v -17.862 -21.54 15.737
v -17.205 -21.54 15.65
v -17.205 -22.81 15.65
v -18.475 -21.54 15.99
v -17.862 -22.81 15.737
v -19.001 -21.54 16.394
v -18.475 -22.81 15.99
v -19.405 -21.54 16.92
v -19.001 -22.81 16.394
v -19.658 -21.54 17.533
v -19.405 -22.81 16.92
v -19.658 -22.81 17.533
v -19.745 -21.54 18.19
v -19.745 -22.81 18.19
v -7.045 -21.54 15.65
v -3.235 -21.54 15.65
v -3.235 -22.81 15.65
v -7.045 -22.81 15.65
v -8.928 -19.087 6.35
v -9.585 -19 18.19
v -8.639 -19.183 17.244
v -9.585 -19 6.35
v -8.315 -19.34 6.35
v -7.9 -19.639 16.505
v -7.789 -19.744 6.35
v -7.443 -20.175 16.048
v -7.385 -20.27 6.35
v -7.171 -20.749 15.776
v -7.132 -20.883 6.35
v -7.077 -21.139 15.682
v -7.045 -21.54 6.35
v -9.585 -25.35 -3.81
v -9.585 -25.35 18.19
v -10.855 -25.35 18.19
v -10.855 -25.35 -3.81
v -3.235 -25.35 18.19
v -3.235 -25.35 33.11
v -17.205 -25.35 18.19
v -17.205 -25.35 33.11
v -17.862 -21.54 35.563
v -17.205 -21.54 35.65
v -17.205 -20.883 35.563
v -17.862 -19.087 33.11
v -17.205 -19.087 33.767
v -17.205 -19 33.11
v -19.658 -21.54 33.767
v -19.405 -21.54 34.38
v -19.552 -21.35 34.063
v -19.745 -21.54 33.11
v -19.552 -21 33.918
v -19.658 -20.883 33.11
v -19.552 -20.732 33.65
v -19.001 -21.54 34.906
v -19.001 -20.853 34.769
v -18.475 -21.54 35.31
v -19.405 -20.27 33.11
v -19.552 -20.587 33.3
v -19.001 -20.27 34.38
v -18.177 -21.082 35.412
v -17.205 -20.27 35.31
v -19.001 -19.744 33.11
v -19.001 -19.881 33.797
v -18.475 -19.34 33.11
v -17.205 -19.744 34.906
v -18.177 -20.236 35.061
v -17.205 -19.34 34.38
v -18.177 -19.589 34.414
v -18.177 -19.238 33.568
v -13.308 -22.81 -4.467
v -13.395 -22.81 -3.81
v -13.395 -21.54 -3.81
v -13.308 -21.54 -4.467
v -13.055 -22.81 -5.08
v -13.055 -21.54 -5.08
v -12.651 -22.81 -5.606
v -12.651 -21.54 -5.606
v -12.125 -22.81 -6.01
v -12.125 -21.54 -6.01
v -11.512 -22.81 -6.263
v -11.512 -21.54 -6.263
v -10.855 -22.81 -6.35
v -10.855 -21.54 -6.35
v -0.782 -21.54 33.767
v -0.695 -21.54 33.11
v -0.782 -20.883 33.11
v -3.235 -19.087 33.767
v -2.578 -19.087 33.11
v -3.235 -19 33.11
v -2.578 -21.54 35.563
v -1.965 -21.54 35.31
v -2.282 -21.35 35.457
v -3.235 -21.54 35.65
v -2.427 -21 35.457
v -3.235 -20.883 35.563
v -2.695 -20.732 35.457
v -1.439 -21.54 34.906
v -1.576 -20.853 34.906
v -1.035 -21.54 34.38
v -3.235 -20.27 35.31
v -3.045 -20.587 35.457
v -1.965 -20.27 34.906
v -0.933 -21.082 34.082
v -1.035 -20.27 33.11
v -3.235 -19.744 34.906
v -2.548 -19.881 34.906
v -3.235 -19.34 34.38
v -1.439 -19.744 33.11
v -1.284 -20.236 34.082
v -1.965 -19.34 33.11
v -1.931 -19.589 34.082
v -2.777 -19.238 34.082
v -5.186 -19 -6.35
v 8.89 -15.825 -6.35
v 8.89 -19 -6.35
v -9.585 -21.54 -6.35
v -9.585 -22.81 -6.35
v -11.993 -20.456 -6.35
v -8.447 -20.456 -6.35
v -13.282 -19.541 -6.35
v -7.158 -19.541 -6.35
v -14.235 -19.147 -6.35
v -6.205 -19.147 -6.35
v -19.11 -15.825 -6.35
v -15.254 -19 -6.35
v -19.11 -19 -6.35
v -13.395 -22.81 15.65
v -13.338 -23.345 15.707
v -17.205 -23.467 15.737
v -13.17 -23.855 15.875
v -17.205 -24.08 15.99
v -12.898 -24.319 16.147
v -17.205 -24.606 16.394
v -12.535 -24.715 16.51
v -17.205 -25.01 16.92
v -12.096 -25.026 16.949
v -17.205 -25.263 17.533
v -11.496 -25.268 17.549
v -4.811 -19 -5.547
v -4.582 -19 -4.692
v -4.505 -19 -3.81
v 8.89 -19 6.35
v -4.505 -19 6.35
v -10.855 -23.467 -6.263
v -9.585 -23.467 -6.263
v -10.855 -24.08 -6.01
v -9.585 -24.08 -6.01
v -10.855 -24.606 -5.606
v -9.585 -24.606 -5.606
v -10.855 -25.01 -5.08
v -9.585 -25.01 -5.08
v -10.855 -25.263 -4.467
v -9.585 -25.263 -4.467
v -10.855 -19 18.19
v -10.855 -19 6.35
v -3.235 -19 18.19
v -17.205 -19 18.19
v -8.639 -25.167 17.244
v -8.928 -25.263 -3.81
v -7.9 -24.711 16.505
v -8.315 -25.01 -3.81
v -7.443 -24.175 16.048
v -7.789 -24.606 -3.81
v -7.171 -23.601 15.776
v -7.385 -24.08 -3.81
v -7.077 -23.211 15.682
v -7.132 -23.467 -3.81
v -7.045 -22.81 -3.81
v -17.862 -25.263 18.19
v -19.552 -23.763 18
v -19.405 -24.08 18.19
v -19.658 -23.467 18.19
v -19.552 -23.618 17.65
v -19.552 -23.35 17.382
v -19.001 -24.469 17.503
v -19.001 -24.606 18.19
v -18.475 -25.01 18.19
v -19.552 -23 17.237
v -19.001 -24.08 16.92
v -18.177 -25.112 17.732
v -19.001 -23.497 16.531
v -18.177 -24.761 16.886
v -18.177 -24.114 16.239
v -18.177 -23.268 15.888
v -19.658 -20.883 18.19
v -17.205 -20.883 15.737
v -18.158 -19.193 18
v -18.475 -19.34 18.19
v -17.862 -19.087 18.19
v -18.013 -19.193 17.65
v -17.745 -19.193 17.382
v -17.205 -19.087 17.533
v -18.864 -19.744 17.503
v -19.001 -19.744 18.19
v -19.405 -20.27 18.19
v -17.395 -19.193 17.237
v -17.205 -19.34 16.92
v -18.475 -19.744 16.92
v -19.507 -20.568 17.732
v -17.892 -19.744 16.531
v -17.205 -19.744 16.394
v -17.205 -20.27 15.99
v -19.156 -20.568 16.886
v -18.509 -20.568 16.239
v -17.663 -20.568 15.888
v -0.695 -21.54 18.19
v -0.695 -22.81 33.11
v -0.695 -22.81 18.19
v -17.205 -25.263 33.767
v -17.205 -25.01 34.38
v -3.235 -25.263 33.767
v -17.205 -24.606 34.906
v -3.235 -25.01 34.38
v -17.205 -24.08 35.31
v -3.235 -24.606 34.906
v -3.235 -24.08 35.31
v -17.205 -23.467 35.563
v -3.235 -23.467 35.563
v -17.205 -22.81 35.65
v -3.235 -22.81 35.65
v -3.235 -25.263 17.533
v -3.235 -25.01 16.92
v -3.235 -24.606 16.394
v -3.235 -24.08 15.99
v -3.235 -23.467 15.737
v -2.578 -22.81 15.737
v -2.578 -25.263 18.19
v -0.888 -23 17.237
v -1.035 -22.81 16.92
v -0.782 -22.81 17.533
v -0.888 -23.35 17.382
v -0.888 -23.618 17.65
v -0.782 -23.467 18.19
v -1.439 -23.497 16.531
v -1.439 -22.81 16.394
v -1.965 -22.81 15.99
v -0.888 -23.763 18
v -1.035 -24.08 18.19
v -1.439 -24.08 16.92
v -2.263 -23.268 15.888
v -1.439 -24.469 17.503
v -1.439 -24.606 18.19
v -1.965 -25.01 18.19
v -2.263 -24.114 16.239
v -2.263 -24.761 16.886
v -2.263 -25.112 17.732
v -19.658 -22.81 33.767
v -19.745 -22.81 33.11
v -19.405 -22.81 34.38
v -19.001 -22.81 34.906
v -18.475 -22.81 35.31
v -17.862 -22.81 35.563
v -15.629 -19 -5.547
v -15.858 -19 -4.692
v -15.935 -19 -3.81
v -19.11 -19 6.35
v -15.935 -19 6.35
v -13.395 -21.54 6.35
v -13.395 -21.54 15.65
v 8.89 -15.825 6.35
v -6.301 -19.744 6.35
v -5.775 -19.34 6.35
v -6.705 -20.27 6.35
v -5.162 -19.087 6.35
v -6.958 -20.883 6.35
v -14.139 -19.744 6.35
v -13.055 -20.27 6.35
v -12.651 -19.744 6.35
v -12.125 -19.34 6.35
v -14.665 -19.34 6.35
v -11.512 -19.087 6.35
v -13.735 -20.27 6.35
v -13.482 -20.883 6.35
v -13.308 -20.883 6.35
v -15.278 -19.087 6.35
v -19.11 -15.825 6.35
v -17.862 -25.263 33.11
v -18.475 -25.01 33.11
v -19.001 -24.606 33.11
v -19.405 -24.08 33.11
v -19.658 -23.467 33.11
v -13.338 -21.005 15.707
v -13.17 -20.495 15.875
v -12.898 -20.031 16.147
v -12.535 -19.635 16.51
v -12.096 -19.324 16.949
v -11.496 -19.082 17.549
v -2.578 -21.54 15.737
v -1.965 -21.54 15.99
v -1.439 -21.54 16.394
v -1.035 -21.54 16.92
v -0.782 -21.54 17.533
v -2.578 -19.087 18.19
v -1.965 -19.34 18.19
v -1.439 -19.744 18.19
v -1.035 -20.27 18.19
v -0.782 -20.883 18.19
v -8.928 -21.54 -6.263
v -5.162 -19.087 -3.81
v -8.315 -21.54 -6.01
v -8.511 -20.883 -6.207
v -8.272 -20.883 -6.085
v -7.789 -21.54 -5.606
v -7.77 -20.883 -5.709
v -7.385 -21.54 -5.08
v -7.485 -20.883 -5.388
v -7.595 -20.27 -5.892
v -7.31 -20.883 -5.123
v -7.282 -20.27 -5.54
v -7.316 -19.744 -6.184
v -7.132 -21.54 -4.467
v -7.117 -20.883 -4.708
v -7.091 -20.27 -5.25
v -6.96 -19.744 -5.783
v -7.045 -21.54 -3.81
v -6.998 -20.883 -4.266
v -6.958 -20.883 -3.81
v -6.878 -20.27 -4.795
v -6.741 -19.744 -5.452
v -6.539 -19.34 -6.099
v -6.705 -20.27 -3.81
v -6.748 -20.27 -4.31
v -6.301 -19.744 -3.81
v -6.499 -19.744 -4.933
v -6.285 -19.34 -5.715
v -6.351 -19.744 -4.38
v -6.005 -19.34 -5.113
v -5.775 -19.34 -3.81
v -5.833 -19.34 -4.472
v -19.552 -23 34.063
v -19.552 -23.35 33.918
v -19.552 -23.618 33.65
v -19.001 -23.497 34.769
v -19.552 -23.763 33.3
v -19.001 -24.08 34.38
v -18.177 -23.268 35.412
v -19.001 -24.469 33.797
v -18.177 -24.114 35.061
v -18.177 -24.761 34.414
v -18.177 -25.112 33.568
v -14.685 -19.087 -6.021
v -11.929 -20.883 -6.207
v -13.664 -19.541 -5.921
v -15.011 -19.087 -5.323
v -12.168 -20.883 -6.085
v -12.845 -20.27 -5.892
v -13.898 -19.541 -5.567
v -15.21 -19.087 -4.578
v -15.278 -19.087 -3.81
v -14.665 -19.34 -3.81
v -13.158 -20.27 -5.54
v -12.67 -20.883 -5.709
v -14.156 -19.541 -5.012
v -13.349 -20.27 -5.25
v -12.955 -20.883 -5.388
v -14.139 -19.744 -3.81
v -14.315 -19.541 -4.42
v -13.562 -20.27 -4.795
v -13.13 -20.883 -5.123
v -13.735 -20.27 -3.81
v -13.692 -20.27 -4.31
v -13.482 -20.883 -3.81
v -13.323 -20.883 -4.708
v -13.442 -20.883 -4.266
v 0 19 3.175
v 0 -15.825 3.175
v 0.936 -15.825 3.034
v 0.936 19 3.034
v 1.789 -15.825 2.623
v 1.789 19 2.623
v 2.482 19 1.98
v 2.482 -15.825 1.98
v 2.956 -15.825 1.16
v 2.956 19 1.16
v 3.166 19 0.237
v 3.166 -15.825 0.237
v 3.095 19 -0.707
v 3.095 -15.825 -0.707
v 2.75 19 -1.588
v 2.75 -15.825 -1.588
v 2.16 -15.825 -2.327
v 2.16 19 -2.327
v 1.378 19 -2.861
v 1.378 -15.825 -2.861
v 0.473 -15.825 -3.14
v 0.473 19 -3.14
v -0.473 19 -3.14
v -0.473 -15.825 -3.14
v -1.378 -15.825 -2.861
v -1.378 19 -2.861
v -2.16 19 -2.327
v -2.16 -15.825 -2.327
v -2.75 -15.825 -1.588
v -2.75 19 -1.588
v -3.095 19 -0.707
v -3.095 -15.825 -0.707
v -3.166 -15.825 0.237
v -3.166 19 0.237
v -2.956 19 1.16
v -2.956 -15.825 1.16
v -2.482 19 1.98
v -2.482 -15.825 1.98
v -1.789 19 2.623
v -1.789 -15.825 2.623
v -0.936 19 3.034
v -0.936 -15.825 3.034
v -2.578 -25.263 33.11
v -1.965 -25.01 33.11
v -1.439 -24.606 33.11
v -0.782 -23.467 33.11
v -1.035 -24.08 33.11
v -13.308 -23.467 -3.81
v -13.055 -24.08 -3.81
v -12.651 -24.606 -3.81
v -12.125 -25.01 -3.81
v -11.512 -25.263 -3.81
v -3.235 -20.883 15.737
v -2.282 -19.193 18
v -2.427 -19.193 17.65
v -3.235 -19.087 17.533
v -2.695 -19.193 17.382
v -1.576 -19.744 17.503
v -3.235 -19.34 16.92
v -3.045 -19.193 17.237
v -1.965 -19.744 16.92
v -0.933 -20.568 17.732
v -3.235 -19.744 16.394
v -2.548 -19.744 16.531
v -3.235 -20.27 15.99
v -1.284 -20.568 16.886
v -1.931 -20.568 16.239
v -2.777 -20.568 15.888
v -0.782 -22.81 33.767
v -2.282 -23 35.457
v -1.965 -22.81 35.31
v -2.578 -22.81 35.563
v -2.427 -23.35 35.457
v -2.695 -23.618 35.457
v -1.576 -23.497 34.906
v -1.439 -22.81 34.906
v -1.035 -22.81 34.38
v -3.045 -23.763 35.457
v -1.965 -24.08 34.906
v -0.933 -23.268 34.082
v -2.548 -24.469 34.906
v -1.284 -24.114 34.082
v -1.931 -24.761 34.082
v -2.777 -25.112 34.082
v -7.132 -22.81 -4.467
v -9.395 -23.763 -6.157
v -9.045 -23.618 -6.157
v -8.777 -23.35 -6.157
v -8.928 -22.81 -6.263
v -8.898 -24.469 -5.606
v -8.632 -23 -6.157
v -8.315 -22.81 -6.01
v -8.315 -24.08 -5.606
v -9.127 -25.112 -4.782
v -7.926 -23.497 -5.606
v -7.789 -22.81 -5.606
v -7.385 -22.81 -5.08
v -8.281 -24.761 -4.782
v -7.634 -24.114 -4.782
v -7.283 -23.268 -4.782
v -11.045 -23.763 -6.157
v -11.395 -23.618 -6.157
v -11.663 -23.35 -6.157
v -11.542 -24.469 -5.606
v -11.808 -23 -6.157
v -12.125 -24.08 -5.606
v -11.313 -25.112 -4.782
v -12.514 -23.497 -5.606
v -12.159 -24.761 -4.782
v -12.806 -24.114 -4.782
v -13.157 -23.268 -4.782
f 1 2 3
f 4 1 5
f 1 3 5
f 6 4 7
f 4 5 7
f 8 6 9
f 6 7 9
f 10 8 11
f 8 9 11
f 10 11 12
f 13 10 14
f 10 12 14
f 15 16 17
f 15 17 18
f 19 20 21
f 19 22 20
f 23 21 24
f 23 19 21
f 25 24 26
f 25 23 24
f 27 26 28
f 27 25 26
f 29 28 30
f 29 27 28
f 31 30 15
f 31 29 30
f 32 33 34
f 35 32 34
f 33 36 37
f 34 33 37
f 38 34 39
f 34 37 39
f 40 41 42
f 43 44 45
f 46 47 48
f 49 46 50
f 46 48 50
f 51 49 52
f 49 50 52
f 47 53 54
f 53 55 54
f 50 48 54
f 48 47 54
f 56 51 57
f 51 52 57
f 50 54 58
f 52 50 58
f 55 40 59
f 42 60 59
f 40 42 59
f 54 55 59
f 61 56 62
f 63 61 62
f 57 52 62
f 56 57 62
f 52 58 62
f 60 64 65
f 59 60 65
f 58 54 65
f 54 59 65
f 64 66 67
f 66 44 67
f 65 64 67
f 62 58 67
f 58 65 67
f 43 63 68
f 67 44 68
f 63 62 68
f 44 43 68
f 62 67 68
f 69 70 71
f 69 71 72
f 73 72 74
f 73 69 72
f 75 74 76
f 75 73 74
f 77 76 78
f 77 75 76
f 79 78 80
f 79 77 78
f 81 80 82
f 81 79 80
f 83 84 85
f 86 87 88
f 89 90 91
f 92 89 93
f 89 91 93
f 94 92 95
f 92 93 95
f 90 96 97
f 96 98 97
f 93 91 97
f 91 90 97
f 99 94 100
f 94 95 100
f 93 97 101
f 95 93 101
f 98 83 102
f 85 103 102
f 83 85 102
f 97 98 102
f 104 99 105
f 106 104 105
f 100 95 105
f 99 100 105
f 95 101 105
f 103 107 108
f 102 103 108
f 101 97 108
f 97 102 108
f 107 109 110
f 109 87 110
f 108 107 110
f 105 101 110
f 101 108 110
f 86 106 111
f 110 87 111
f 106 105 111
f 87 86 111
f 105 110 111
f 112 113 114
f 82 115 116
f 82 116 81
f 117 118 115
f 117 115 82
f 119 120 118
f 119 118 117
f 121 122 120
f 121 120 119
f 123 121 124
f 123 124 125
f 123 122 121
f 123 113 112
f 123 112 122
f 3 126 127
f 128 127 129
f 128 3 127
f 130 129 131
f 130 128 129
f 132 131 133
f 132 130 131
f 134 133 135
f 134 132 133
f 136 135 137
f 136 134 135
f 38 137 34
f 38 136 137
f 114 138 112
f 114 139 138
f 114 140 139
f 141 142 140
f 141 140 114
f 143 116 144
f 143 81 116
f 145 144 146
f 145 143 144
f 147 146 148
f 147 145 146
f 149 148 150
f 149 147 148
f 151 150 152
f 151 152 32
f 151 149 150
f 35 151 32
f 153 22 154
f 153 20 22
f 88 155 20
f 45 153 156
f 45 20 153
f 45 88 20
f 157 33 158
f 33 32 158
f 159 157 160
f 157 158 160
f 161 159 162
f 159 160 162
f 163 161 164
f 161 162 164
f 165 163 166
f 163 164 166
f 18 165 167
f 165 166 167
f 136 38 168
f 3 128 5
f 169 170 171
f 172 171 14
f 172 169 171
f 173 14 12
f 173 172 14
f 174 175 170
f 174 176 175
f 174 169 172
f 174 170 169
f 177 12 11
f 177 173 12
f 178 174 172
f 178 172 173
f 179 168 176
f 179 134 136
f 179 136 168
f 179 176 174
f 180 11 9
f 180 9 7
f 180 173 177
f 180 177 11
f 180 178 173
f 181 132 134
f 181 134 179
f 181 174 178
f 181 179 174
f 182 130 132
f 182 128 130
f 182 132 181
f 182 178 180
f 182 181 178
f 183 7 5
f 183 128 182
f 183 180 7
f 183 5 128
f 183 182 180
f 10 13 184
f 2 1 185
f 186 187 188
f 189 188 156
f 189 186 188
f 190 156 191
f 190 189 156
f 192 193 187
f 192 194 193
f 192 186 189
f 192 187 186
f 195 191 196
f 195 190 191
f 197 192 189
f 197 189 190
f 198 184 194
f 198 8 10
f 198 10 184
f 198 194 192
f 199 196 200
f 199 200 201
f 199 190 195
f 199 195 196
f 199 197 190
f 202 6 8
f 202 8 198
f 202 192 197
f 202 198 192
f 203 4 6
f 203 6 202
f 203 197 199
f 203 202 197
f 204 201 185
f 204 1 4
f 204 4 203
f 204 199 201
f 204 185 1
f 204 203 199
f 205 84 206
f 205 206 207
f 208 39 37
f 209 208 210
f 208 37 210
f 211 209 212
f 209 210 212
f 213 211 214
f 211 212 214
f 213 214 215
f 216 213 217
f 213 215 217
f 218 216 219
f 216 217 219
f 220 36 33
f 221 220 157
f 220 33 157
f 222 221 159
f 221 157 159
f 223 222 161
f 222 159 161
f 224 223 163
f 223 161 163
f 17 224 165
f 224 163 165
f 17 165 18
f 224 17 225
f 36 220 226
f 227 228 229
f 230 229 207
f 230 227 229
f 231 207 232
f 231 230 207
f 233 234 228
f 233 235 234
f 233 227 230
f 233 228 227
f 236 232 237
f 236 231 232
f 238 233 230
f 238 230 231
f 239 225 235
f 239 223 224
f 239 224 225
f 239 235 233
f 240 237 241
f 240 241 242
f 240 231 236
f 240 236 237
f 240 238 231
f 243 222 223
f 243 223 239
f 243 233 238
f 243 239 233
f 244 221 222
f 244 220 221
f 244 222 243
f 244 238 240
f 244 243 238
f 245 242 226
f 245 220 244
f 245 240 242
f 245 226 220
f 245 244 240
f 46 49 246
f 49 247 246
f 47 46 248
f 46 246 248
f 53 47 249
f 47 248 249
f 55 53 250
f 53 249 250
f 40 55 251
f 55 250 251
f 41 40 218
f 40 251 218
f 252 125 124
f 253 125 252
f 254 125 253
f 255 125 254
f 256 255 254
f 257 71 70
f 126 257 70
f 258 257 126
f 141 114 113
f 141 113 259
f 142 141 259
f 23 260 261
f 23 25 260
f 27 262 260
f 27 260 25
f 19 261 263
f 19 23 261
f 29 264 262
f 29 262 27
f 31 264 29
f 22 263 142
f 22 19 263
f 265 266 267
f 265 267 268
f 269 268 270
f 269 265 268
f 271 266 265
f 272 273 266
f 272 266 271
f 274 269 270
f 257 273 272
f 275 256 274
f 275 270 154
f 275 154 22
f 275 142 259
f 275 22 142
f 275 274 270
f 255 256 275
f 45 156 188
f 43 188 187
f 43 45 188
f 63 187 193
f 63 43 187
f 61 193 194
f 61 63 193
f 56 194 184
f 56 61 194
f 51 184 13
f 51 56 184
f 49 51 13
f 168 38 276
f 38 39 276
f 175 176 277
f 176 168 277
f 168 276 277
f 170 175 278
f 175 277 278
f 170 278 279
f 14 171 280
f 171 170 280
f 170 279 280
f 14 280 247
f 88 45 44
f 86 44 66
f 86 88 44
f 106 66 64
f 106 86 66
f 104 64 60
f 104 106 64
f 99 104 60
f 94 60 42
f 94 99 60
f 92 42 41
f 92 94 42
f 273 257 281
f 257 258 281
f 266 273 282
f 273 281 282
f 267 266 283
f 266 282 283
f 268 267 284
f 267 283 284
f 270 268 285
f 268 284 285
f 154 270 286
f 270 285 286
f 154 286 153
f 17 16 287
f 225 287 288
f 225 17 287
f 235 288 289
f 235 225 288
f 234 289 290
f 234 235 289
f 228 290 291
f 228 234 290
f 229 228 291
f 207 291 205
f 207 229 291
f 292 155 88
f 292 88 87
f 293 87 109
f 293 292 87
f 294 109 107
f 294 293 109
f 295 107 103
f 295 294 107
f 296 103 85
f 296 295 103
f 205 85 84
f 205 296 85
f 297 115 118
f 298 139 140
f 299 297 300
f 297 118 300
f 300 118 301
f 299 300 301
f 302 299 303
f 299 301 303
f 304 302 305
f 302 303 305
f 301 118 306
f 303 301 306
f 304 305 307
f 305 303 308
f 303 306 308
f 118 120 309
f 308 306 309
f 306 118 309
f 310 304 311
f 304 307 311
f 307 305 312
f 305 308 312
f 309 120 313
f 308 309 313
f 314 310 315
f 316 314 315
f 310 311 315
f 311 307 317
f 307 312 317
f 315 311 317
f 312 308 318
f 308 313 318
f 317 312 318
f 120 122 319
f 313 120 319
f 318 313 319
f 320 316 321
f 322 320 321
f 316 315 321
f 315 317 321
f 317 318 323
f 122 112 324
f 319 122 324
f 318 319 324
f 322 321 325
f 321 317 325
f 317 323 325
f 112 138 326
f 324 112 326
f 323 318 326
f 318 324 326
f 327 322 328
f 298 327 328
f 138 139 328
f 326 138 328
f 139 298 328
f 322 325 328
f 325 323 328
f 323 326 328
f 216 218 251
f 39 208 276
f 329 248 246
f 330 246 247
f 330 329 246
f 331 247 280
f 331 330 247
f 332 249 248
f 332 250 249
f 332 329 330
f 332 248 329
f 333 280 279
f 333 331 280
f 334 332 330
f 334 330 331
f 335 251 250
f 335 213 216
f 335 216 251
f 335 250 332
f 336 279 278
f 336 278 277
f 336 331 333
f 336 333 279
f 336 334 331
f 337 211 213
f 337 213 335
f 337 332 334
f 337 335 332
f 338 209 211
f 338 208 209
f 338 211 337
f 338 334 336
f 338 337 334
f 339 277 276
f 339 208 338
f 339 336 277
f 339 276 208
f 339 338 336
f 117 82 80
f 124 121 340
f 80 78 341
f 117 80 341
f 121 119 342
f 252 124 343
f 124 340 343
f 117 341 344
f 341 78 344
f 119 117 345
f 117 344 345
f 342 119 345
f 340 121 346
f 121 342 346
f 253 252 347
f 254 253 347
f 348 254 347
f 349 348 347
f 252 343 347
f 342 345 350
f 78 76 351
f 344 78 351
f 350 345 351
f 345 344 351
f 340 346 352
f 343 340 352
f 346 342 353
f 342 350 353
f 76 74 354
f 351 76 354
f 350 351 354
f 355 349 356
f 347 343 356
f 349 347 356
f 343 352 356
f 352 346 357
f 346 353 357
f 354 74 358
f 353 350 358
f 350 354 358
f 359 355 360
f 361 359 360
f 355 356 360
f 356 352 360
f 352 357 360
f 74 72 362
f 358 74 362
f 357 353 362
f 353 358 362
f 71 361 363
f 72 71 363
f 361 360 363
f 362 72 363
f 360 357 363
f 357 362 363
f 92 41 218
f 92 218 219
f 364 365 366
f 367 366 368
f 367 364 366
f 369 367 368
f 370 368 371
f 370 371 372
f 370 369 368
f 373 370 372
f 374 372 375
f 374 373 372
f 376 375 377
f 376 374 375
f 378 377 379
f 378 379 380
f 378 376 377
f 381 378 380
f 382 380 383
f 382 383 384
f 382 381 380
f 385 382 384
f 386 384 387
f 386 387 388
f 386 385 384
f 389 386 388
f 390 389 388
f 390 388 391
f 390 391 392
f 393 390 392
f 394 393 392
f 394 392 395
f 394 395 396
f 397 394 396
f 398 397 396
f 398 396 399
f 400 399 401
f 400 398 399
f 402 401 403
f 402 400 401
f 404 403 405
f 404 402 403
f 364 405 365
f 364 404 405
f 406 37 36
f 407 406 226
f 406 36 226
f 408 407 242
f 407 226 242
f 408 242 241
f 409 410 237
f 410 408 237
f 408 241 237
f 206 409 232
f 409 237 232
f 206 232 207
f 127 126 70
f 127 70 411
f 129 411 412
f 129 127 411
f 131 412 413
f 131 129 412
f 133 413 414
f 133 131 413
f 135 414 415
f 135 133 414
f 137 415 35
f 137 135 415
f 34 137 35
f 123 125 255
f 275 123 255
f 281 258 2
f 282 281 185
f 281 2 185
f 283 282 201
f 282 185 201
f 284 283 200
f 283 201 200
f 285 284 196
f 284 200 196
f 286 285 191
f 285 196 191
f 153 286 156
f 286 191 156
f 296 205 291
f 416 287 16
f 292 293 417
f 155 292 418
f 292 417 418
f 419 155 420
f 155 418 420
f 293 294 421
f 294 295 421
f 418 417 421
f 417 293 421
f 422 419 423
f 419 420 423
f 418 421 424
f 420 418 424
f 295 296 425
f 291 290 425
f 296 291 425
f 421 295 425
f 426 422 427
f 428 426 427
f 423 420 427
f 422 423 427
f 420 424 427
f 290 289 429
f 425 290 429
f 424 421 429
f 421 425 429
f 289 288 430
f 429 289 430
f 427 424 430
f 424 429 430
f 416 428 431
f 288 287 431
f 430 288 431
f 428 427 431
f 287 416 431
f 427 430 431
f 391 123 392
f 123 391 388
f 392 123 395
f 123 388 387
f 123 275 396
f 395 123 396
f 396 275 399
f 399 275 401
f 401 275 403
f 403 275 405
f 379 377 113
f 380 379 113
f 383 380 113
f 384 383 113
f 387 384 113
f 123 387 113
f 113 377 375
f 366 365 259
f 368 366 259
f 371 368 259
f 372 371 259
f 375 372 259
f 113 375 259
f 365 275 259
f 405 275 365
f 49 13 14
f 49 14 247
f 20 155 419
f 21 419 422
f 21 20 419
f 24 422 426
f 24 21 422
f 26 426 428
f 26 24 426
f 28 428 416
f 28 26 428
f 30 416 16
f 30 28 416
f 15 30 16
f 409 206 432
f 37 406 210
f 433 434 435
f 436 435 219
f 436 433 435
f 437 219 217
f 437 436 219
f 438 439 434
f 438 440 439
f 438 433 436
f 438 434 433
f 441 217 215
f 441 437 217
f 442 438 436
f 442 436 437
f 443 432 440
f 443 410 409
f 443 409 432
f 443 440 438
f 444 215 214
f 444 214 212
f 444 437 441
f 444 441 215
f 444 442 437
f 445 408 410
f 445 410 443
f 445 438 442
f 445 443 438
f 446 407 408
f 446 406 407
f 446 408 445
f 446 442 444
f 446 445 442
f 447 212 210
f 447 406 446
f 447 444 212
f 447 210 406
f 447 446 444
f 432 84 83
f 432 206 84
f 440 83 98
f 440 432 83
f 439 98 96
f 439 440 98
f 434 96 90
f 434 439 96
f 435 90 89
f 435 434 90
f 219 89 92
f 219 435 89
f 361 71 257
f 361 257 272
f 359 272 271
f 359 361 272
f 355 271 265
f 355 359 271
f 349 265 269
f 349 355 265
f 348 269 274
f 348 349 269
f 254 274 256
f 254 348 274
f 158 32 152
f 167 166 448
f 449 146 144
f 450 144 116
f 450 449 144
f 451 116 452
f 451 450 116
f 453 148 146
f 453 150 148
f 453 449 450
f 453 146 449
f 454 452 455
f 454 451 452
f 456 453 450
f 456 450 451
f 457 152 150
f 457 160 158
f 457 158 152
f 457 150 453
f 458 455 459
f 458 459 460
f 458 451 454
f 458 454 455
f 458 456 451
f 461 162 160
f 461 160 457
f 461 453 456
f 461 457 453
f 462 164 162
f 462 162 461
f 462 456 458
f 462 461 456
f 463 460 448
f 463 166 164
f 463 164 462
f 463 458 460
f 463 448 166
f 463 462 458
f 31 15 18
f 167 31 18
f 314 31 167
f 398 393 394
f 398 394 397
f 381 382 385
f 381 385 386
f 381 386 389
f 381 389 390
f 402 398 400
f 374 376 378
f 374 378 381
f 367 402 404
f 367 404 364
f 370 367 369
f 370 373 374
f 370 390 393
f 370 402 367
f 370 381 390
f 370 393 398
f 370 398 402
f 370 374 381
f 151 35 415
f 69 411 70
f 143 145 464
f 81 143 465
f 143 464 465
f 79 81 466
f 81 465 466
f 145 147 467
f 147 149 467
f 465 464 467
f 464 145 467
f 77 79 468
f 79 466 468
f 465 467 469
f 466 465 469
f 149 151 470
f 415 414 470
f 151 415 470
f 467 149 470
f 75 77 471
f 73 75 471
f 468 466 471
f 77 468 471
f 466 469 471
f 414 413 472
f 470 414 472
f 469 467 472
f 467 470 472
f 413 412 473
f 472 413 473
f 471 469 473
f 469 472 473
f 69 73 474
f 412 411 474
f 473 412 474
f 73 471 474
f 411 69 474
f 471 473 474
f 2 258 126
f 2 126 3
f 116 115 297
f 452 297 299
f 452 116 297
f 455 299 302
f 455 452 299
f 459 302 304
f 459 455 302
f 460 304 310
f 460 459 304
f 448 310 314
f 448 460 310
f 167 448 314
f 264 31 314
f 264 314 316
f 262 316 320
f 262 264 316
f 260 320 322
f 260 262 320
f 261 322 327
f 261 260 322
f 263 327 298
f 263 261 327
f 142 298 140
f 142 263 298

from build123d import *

# Parameters (mm, degrees)
SKETCH1_R           = 3.175
BOSS_EXTRUDE1_DEPTH = 19
SKETCH2_W           = 28
SKETCH2_H           = 12.7
BOSS_EXTRUDE2_DEPTH = 3.175
BOSS_EXTRUDE3_DEPTH = 6.35
FILLET1_R           = 2.54
FILLET2_R           = 2.54


with BuildPart() as part:
    # Sketch1 → Boss-Extrude1 (new, symmetric)
    with BuildSketch(Plane(origin=(0, 0, 0), x_dir=(1, 0, 0), z_dir=(0, 1, 0))):
        with Locations(Location((0, 0, 0), (0, 0, 270))):
            Circle(SKETCH1_R)
    extrude(amount=BOSS_EXTRUDE1_DEPTH, both=True)

    # Sketch2 → Boss-Extrude2 (add)
    with BuildSketch(Plane.XZ.offset(19)):
        with Locations((-5.11, 0)):
            Rectangle(SKETCH2_W, SKETCH2_H)
    extrude(amount=-BOSS_EXTRUDE2_DEPTH)

    # Sketch3 → Boss-Extrude3 (add)
    with BuildSketch(Plane.XZ.offset(19)):
        Polygon((-13.395, -6.35), (-13.395, 15.65), (-19.745, 15.65), (-19.745, 35.65), (-0.695, 35.65), (-0.695, 15.65), (-7.045, 15.65), (-7.045, -6.35), align=None)
    extrude(amount=BOSS_EXTRUDE3_DEPTH)

    # Fillet1
    fillet1_edges = [part.edges().sort_by_distance(p)[0] for p in [
        (-13.395, -25.35, 4.65),
        (-16.57, -25.35, 15.65),
        (-3.87, -25.35, 15.65),
        (-7.045, -25.35, 4.65),
        (-10.22, -25.35, -6.35),
        (-0.695, -22.175, 15.65),
        (-0.695, -25.35, 25.65),
        (-0.695, -19, 25.65),
        (-0.695, -22.175, 35.65),
        (-10.22, -25.35, 35.65),
        (-10.22, -19, 35.65),
        (-19.745, -22.175, 35.65),
        (-19.745, -25.35, 25.65),
        (-19.745, -22.175, 15.65),
        (-19.745, -19, 25.65),
        (-3.87, -19, 15.65),
        (-16.57, -19, 15.65),
        (-7.045, -19, 11),
        (-13.395, -19, 11),
        (-7.045, -22.175, -6.35),
        (-13.395, -22.175, -6.35),
    ]]
    fillet(fillet1_edges, radius=FILLET1_R)

    # Fillet2
    # the kernel refuses this fillet: 2.54 mm, written as the material it adds along each edge
    with BuildSketch(Plane(origin=(-9.585, -19, -3.81), x_dir=(-0.5976672776328281, 0, 0.8017442392976477), z_dir=(0.8017442392976477, 0, 0.5976672776328281))) as fillet2_piece_1_section:
        with BuildLine():
            CenterArc((2.54 + FILLET2_R, FILLET2_R), FILLET2_R, 180, 90)
            Line((2.54, FILLET2_R), (2.54, 0))
            Line((2.54, 0), (2.54 + FILLET2_R, 0))
        make_face()
    fillet2_piece_1 = revolve(axis=Axis((-9.585, -19, -3.81), (0, -1, 0)), revolution_arc=233.296989237, mode=Mode.PRIVATE)
    fillet2_piece_1 = split(fillet2_piece_1, bisect_by=Plane(origin=(-13.679769983, -19.079873008, -6.35), z_dir=(0, 0, 1)), keep=Keep.TOP, mode=Mode.PRIVATE)
    add(fillet2_piece_1)
    with BuildSketch(Plane(origin=(-10.855, -19, -3.81), x_dir=(0.5976672776328281, 0, 0.8017442392976477), z_dir=(-0.8017442392976477, 0, 0.5976672776328281))) as fillet2_piece_2_section:
        with BuildLine():
            CenterArc((2.54 + FILLET2_R, -FILLET2_R), FILLET2_R, 90, 90)
            Line((2.54, -FILLET2_R), (2.54, 0))
            Line((2.54, 0), (2.54 + FILLET2_R, 0))
        make_face()
    fillet2_piece_2 = revolve(axis=Axis((-10.855, -19, -3.81), (0, 1, 0)), revolution_arc=233.296989237, mode=Mode.PRIVATE)
    fillet2_piece_2 = split(fillet2_piece_2, bisect_by=Plane(origin=(-6.760230017, -19.079873008, -6.35), z_dir=(0, 0, 1)), keep=Keep.TOP, mode=Mode.PRIVATE)
    add(fillet2_piece_2)
    with BuildSketch(Plane(origin=(-7.045, -19, 6.35), x_dir=(1, 0, 0), z_dir=(0, 0, -1)), Plane(origin=(-13.395, -19, -3.81), x_dir=(-1, 0, 0), z_dir=(0, 0, 1))) as fillet2_piece_3:
        with BuildLine():
            CenterArc((FILLET2_R, FILLET2_R), FILLET2_R, 180, 90)
            Line((0, FILLET2_R), (0, 0))
            Line((0, 0), (FILLET2_R, 0))
        make_face()
    extrude(amount=10.16)


solid = part.part
